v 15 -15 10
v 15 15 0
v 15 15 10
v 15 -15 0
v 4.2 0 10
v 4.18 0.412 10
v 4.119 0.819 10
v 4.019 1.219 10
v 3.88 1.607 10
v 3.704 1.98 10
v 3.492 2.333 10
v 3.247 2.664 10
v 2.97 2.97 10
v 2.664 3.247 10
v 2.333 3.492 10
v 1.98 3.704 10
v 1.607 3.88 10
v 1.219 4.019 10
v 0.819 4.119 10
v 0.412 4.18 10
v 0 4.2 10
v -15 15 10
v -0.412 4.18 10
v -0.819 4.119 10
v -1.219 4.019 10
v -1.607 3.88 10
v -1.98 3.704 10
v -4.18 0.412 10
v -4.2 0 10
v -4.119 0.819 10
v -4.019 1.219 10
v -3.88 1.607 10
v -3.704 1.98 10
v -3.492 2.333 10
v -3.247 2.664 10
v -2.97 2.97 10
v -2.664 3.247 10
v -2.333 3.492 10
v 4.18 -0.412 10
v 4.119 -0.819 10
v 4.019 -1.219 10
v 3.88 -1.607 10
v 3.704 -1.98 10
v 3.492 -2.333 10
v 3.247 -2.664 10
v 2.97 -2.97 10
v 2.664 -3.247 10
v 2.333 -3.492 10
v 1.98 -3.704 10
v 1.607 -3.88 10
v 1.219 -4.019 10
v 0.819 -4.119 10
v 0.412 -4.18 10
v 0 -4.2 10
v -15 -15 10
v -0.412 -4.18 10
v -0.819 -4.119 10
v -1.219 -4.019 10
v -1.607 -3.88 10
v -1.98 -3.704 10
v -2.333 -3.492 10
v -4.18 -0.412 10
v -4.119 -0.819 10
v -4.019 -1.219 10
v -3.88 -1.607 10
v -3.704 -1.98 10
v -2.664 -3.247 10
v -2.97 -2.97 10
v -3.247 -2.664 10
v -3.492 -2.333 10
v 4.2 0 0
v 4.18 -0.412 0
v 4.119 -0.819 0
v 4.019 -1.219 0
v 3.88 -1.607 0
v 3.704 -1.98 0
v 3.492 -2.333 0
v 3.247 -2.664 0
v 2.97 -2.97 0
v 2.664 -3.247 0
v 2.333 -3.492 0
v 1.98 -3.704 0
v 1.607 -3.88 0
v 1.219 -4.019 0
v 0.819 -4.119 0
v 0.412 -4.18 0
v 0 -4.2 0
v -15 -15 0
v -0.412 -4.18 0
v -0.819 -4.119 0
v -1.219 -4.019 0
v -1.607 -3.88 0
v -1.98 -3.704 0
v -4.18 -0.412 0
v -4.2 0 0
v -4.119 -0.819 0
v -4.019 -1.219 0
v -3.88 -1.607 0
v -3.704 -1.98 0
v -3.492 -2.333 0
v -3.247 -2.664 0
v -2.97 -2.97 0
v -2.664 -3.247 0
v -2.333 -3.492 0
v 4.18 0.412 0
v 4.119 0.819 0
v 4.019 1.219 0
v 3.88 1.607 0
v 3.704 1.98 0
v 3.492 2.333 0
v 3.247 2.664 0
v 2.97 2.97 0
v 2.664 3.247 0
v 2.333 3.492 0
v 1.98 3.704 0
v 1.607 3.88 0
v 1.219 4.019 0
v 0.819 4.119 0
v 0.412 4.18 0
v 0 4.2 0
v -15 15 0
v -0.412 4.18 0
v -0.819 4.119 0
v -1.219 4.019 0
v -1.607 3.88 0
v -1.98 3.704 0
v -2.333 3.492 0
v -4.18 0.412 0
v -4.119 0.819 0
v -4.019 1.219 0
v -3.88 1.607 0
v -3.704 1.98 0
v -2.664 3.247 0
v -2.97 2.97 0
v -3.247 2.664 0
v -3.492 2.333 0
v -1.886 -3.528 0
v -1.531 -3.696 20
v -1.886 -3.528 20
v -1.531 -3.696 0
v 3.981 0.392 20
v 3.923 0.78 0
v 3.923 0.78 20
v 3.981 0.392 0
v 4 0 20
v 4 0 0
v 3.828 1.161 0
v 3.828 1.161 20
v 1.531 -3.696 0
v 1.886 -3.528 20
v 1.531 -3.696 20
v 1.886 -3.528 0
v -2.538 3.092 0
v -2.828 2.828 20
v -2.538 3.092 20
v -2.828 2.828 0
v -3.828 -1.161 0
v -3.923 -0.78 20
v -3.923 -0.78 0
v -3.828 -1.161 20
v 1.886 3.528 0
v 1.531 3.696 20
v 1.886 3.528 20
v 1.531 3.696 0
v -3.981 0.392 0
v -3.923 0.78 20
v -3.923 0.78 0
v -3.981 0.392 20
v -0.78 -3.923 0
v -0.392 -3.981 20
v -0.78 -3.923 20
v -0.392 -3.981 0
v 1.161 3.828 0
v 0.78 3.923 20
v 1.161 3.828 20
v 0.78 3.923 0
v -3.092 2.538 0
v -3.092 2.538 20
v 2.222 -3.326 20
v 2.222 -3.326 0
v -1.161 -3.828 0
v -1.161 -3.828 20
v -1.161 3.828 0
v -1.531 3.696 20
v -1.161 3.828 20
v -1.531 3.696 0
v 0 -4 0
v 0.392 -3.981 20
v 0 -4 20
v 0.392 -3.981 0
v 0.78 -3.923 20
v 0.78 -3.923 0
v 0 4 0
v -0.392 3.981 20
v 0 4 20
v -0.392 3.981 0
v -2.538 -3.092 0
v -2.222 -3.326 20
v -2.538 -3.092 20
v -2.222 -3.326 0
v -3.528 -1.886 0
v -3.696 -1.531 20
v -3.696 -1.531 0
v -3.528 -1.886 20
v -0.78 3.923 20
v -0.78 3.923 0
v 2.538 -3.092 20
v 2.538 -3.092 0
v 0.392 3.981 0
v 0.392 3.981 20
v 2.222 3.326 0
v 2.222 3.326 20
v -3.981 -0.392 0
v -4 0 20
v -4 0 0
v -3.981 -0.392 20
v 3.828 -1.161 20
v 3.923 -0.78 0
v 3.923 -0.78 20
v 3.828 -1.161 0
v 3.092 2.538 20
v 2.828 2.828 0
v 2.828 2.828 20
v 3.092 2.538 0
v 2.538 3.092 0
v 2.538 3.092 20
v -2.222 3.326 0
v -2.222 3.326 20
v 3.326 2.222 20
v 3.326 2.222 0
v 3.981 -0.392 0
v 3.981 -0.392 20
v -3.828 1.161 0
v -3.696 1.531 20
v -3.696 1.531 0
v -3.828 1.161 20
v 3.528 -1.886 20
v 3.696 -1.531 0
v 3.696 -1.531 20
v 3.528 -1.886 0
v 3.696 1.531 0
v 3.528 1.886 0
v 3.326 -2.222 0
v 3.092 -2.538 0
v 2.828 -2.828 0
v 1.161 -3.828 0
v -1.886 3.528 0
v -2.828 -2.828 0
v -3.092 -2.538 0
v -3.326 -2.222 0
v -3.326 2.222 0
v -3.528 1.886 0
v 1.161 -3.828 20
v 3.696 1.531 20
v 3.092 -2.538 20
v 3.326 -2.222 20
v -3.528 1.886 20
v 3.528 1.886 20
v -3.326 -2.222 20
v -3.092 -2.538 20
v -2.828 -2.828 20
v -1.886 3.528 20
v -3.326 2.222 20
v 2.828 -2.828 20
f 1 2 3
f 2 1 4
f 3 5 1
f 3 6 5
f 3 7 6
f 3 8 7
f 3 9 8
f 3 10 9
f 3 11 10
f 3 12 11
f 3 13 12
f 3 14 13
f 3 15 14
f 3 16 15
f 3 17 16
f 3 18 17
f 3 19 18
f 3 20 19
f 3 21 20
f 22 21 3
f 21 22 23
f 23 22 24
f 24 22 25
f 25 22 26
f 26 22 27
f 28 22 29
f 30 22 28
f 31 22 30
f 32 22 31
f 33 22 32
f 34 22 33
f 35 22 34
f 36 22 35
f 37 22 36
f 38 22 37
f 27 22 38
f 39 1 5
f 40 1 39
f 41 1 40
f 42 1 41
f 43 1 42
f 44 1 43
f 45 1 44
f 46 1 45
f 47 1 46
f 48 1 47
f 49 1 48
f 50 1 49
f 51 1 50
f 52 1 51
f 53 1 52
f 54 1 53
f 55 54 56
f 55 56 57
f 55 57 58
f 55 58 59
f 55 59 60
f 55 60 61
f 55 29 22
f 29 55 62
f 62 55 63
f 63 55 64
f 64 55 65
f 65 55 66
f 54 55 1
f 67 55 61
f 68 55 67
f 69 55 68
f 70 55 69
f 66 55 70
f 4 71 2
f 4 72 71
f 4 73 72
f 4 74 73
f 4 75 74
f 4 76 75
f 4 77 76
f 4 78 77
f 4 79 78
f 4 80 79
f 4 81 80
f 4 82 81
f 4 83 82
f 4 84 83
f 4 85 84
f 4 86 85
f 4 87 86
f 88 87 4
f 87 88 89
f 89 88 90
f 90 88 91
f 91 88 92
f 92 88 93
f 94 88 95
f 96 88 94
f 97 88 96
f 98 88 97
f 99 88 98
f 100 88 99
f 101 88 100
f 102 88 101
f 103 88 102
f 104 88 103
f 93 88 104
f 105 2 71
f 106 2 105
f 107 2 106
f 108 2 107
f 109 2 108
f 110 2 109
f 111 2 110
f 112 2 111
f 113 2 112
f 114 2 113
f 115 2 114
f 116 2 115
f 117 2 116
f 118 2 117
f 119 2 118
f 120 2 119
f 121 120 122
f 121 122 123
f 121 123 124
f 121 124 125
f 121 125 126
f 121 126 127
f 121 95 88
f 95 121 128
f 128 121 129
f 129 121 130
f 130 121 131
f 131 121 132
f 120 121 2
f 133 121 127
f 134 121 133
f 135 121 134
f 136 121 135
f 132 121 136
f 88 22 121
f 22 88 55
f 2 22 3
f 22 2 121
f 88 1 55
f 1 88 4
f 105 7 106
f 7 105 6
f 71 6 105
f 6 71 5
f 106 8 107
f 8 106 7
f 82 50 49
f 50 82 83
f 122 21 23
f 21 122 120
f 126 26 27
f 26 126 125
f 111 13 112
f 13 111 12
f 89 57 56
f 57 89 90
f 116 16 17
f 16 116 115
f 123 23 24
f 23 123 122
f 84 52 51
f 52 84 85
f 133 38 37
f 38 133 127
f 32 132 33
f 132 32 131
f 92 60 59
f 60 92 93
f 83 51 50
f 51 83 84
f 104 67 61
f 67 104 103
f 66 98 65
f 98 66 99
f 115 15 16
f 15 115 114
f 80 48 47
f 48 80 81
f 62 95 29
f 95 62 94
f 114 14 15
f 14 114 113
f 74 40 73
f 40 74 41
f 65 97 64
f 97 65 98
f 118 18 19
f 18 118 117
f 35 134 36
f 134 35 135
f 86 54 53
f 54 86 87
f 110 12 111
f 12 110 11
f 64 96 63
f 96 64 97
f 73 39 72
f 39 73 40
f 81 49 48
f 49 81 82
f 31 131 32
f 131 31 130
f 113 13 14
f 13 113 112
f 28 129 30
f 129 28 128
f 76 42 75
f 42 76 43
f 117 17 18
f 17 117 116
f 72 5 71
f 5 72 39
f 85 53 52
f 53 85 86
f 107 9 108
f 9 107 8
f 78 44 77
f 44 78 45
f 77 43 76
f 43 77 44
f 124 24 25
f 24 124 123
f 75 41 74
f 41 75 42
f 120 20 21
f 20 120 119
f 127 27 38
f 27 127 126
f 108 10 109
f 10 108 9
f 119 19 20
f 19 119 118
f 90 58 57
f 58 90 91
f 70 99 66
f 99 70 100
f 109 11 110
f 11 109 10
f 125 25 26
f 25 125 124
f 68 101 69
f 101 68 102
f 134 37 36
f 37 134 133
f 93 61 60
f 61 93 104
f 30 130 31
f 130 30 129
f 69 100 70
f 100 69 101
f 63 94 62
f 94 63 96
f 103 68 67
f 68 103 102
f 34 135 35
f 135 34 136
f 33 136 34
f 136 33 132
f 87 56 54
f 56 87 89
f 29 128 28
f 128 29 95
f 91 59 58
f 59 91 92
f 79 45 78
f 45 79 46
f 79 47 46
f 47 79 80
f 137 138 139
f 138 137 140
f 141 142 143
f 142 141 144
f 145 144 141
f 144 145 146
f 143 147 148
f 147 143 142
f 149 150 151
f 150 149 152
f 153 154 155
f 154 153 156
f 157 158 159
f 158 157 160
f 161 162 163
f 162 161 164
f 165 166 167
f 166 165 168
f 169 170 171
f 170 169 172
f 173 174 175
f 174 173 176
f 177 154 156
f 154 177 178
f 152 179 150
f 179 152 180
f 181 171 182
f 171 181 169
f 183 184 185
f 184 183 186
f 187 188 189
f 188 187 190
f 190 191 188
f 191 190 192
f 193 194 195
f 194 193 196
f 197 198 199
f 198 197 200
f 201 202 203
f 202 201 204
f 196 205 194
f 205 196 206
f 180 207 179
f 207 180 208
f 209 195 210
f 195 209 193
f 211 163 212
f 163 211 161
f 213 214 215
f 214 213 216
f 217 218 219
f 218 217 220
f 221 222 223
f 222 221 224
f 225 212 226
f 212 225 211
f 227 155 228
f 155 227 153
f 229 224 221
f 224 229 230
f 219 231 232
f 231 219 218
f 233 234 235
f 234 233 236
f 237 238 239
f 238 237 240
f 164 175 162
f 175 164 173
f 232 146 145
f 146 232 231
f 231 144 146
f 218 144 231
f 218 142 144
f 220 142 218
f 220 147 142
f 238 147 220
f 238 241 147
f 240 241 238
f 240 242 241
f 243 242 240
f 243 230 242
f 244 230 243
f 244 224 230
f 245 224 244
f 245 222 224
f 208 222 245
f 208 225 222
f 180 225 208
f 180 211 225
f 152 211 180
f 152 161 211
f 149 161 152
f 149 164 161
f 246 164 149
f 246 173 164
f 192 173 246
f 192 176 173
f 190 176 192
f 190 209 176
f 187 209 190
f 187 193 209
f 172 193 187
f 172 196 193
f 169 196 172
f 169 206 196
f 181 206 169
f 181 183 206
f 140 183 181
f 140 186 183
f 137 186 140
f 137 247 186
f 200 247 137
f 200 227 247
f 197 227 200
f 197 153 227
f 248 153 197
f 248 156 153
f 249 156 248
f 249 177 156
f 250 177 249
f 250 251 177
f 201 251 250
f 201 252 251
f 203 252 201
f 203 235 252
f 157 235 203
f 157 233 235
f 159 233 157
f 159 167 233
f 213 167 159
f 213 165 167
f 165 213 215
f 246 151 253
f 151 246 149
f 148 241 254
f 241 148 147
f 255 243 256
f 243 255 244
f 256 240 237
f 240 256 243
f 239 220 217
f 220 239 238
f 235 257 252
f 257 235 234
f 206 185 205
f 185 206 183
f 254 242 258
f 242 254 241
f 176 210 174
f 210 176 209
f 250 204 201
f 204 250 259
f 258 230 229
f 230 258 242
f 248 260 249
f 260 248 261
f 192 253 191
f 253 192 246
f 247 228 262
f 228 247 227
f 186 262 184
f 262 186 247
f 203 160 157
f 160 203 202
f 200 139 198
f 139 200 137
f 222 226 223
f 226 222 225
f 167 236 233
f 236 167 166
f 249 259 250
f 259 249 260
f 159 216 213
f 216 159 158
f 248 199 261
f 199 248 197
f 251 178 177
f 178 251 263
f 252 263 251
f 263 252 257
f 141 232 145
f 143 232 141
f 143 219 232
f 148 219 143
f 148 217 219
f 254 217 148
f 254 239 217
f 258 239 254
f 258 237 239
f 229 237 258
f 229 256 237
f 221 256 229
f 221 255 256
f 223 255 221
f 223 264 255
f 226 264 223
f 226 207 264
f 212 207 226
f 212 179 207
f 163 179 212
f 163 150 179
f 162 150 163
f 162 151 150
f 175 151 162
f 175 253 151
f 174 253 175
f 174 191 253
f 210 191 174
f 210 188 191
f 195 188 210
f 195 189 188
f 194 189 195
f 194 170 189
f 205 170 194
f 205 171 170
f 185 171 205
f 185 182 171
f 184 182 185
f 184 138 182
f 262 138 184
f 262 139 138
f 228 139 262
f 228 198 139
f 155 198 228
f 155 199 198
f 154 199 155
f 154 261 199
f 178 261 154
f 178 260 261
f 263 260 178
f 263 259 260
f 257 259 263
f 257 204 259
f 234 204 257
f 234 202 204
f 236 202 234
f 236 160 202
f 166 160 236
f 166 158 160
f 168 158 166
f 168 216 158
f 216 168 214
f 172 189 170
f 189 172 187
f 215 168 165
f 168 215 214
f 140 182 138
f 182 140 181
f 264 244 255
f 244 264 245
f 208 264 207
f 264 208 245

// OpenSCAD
// Peg shown inserted in its hole; the clearance must keep the parts disjoint.
block_x = 30;
block_y = 30;
block_z = 10;
peg_d = 8.0;
peg_h = 20;
hole_d = 8.4;

module hole_block() {
    difference() {
        translate([-block_x / 2, -block_y / 2, 0])
            cube([block_x, block_y, block_z]);
        translate([0, 0, -1])
            cylinder(h = block_z + 2, d = hole_d, $fn = 64);
    }
}

module peg() {
    cylinder(h = peg_h, d = peg_d, $fn = 64);
}

hole_block();
peg();
